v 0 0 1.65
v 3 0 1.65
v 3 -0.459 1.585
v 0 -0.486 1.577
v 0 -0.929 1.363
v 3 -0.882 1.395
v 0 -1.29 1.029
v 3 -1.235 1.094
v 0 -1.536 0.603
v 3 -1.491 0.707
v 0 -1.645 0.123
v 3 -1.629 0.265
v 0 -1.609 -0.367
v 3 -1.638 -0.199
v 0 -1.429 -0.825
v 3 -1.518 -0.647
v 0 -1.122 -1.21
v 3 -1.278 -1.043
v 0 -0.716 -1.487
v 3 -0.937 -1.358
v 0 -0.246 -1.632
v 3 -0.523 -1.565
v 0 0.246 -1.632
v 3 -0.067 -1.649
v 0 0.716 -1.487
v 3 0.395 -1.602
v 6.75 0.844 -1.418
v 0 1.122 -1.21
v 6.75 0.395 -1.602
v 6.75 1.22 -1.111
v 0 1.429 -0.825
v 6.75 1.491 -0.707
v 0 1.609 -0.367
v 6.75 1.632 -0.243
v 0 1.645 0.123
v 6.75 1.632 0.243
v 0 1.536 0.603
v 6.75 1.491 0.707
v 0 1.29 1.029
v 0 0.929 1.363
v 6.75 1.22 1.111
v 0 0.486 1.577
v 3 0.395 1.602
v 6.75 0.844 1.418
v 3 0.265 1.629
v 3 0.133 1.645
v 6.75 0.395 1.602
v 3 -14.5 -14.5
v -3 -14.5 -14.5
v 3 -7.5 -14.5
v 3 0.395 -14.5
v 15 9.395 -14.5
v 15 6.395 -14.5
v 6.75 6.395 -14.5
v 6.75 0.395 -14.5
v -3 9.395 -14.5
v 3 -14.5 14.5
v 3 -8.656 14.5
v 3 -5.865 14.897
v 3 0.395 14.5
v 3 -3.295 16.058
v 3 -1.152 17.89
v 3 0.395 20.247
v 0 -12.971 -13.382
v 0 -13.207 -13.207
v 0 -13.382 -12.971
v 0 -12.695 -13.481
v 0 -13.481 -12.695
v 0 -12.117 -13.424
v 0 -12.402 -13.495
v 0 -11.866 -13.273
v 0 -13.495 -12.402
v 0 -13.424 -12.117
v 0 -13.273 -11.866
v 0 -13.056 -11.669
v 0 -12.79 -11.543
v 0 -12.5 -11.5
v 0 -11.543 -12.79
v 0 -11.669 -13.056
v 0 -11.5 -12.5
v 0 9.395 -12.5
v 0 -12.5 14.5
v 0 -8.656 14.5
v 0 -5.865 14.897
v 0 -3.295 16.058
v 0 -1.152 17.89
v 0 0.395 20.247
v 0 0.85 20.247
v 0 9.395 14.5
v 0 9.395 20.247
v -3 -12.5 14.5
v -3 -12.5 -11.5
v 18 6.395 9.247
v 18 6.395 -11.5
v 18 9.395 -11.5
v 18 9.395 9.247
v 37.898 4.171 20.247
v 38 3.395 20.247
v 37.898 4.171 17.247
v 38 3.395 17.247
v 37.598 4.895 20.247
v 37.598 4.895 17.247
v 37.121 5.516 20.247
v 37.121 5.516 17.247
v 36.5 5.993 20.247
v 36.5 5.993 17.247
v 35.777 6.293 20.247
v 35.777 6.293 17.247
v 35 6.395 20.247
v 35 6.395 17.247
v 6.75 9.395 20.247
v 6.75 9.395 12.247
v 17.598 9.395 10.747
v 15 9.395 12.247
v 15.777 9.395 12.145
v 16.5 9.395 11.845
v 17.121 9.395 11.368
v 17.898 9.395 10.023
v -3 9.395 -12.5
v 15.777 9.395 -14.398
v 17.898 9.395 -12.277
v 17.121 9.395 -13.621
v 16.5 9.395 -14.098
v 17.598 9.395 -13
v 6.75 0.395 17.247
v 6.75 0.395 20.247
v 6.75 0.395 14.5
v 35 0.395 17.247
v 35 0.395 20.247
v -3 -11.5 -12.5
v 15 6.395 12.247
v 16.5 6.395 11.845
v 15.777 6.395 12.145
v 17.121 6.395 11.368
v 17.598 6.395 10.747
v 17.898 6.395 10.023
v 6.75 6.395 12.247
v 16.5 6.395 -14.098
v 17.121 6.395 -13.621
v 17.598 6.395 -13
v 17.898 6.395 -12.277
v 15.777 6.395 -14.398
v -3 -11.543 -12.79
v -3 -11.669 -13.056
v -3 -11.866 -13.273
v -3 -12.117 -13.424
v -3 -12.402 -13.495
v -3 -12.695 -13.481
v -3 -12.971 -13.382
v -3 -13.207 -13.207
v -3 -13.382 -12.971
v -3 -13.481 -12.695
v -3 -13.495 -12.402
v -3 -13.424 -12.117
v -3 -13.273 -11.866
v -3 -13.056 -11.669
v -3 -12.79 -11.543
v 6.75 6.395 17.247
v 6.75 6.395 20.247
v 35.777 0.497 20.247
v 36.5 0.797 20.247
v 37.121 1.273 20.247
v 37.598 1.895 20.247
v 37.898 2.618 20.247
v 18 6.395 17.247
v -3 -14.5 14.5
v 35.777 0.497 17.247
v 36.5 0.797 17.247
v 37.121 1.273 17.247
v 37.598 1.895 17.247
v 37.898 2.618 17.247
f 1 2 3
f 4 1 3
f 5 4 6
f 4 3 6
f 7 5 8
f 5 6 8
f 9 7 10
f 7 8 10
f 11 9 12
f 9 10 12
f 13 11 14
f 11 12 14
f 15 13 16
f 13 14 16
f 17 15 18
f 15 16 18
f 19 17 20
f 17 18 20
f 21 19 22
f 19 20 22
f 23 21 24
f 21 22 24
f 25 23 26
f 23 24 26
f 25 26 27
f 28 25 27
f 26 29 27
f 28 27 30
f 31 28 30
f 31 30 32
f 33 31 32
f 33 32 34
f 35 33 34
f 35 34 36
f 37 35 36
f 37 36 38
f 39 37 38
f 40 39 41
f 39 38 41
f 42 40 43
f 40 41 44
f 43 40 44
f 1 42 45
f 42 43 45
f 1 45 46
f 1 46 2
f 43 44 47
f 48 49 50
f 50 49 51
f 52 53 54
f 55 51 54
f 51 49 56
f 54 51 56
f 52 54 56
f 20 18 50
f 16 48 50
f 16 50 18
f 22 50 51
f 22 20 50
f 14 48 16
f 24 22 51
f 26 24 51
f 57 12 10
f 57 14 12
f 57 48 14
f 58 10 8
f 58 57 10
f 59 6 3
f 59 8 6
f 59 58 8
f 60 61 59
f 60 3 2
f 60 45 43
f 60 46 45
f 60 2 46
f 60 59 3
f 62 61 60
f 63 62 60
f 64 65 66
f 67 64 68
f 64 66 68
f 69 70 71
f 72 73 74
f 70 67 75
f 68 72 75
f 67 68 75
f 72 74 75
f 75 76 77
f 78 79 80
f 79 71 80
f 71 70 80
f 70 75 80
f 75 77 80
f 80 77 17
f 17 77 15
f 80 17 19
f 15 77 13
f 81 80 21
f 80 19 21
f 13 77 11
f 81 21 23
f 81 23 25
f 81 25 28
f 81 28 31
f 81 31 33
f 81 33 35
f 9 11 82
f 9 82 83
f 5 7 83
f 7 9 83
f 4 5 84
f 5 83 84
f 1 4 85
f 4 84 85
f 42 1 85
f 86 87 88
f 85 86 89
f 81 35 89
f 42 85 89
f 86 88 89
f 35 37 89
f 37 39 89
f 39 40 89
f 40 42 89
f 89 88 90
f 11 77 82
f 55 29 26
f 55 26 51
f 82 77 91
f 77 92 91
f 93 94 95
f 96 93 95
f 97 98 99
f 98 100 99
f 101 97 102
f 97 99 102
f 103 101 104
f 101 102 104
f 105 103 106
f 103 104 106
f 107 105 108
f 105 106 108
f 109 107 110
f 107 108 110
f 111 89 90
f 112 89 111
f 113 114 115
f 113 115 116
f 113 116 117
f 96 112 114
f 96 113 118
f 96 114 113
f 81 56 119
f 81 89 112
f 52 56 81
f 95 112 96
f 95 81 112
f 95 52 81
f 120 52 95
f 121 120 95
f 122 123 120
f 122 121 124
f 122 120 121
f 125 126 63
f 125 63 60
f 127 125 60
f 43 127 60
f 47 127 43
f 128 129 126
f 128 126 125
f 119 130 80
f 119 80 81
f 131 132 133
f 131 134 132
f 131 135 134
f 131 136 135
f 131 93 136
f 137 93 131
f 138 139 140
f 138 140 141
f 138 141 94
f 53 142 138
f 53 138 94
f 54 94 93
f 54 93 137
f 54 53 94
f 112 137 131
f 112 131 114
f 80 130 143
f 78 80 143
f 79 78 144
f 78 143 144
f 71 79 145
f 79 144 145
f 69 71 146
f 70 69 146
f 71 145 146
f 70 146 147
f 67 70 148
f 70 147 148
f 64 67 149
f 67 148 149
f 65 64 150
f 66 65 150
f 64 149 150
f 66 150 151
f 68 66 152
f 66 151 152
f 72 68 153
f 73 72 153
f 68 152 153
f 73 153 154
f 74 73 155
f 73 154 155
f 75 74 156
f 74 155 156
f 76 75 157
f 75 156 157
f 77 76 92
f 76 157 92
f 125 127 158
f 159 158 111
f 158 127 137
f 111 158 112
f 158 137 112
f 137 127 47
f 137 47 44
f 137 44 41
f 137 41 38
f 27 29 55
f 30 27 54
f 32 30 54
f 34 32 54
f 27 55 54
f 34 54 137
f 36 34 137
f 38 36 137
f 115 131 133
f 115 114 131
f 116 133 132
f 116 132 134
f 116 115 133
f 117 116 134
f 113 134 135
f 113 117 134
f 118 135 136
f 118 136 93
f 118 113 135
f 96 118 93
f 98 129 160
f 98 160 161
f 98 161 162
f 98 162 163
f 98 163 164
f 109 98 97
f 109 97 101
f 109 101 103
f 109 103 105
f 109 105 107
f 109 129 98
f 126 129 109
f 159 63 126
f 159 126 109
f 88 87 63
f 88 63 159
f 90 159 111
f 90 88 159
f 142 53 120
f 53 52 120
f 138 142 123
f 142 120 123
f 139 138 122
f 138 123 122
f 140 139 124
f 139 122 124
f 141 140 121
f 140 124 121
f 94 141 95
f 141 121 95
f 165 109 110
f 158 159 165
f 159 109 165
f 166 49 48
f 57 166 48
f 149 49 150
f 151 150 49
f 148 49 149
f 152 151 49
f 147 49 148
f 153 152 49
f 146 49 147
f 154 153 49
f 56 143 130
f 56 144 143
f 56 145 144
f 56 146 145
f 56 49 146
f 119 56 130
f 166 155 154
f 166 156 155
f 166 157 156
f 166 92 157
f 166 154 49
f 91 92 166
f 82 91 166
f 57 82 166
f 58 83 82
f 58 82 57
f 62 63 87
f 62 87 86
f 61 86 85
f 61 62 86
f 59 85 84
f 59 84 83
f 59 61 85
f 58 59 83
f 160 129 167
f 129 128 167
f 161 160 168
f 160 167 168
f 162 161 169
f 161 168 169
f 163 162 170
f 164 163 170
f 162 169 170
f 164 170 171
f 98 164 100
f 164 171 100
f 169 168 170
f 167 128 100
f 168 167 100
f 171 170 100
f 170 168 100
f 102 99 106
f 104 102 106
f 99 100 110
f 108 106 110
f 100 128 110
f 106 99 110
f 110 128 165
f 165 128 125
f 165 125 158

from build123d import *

# Parameters (mm, degrees)
EXTRUDE_1_DEPTH      = 5
EXTRUDE_1_DEPTH_BACK = 3
SKETCH_2_W           = 29
SKETCH_2_H           = 29
SKETCH_3_W           = 25
SKETCH_3_H           = 25
CUT_EXTRUDE_1_DEPTH  = 3
SKETCH_5_R           = 1
CUT_EXTRUDE_3_DEPTH  = 3
CUT_EXTRUDE_4_DEPTH  = 23.011360703
HOLE_WIZARD_M3_1_D   = 2.5
SKETCH_4_W           = 8
SKETCH_4_H           = 29
EXTRUDE_2_DEPTH      = 13.4052
SKETCH_7_W           = 29
SKETCH_7_H           = 5
EXTRUDE_3_DEPTH      = 5
SKETCH_10_W          = 29
SKETCH_10_H          = 13.4052
CUT_EXTRUDE_5_DEPTH  = 35.028667136
EXTRUDE_4_DEPTH      = 28
SKETCH_13_W          = 22.441758485
SKETCH_13_H          = 29
CUT_EXTRUDE_7_DEPTH  = 20.8948
SKETCH_14_W          = 27
SKETCH_14_H          = 6.1052
CUT_EXTRUDE_8_DEPTH  = 10
EXTRUDE_5_DEPTH      = 10
SKETCH_16_W          = 12.441758485
SKETCH_16_H          = 20.8948
CUT_EXTRUDE_9_DEPTH  = 5
CUT_EXTRUDE_10_DEPTH = 5
SKETCH_18_W          = 7.441758485
SKETCH_18_H          = 20.8948
CUT_EXTRUDE_11_DEPTH = 1.9068532
SKETCH_19_W          = 18
SKETCH_19_H          = 8
CUT_EXTRUDE_12_DEPTH = 7
SKETCH_20_W          = 3.0931468
SKETCH_20_H          = 11
EXTRUDE_6_DEPTH      = 20
SKETCH_21_W          = 3.0931468
SKETCH_21_H          = 2.8948
CUT_EXTRUDE_13_DEPTH = 7.441758485
SKETCH_22_W          = 29
SKETCH_22_H          = 7
CUT_EXTRUDE_14_DEPTH = 7.558241515
EXTRUDE_7_DEPTH      = 3
SKETCH_24_W          = 3
SKETCH_24_H          = 11
CUT_EXTRUDE_15_DEPTH = 50.942466899
CUT_EXTRUDE_16_DEPTH = 3.8082415
SKETCH_26_W          = 11.249999985
SKETCH_26_H          = 6.1052
CUT_EXTRUDE_17_DEPTH = 6.0931468
SKETCH_27_W          = 6.0931468
SKETCH_27_H          = 6.1052
CUT_EXTRUDE_18_DEPTH = 43.86096708
CUT_EXTRUDE_19_DEPTH = 3.1052
SKETCH_30_W          = 3.750000015
SKETCH_30_H          = 32.721043552
CUT_EXTRUDE_20_DEPTH = 7.8948
CUT_EXTRUDE_21_DEPTH = 4.9068532
SKETCH_32_W          = 31.249999985
SKETCH_32_H          = 6.0931468
CUT_EXTRUDE_22_DEPTH = 3.5
SKETCH_33_W          = 11
SKETCH_33_H          = 13.8948
EXTRUDE_8_DEPTH      = 3
SKETCH_34_W          = 11
SKETCH_34_H          = 6.3948
CUT_EXTRUDE_25_DEPTH = 49.005208051
EXTRUDE_9_DEPTH      = 0.3948
SKETCH_36_W          = 38
SKETCH_36_H          = 7.8948
CUT_EXTRUDE_26_DEPTH = 2.5931468
CUT_EXTRUDE_27_DEPTH = 3.5
SKETCH_38_W          = 1.185809648
SKETCH_38_H          = 4.3948
CUT_EXTRUDE_28_DEPTH = 3.750000015
EXTRUDE_11_DEPTH     = 3
EXTRUDE_12_REACH     = 51.952
SKETCH_41_W          = 35
SKETCH_41_H          = 4.3948
EXTRUDE_13_DEPTH     = 2.16
SKETCH_42_W          = 11.238283167
SKETCH_42_H          = 6
EXTRUDE_14_DEPTH     = 3
SKETCH_43_W          = 3
SKETCH_43_H          = 6
EXTRUDE_15_DEPTH     = 20.011716818
SKETCH_44_W          = 3.319178761
SKETCH_44_H          = 21.949008861
CUT_EXTRUDE_29_DEPTH = 47.679480755
SKETCH_45_W          = 3
SKETCH_45_H          = 4.3948
CUT_EXTRUDE_30_DEPTH = 35
SKETCH_46_W          = 5.7468532
SKETCH_46_H          = 8.544893469
EXTRUDE_16_DEPTH     = 18
SKETCH_47_W          = 11.249999985
SKETCH_47_H          = 5.544893469
CUT_EXTRUDE_31_DEPTH = 2.7468532
SKETCH_48_W          = 5.7468532
SKETCH_48_H          = 14.8948
CUT_EXTRUDE_32_DEPTH = 43.95561738
SKETCH_49_W          = 8
SKETCH_49_H          = 3
CUT_EXTRUDE_33_DEPTH = 11.249999985
FILLET_3_R           = 10
FILLET_4_R           = 3
HOLE_WIZARD_M4_1_D   = 3.3


# Some blends are built 0.0001 mm under size
with BuildPart() as part:
    # 草图2 → 凸台-拉伸1 (new, two sides: drawn at the far end of the back side and taken through both)
    with BuildSketch(Plane(origin=(0, 0, 0), x_dir=(0, 0, -1), z_dir=(1, 0, 0)).offset(-EXTRUDE_1_DEPTH_BACK)):
        Rectangle(SKETCH_2_W, SKETCH_2_H)
    extrude(amount=EXTRUDE_1_DEPTH + EXTRUDE_1_DEPTH_BACK)

    # 草图3 → 切除-拉伸1 (cut)
    with BuildSketch(Plane.ZY.offset(3)):
        Rectangle(SKETCH_3_W, SKETCH_3_H)
    extrude(amount=-CUT_EXTRUDE_1_DEPTH, mode=Mode.SUBTRACT)

    # 草图5 → 切除-拉伸3 (cut)
    with BuildSketch(Plane.ZY.offset(3)):
        with Locations((-12.5, -12.5)):
            Circle(SKETCH_5_R)
    extrude(amount=-CUT_EXTRUDE_3_DEPTH, mode=Mode.SUBTRACT)

    # 草图6 → 切除-拉伸4 (cut, through all)
    with BuildSketch(Plane.ZY.offset(3)):
        Polygon((12.5, 12.5), (12.5, -12.5), (14.5, -12.5), (14.5, 14.5), (-12.5, 14.5), (-14.5, 14.5), (-14.5, 12.5), (-12.5, 12.5), align=None)
    extrude(amount=-CUT_EXTRUDE_4_DEPTH, mode=Mode.SUBTRACT)

    # M3 螺纹孔1 (through all)
    with Locations(Plane.ZY):
        with Locations((0, 0)):
            Hole(HOLE_WIZARD_M3_1_D / 2)

    # 草图4 → 凸台-拉伸2 (add)
    with BuildSketch(Plane.XZ.offset(14.5)):
        with Locations((1, 0)):
            Rectangle(SKETCH_4_W, SKETCH_4_H)
    extrude(amount=EXTRUDE_2_DEPTH)

    # 草图7 → 凸台-拉伸3 (add)
    with BuildSketch(Plane(origin=(5, 0, 0), x_dir=(0, 0, -1), z_dir=(1, 0, 0))):
        with Locations((0, -25.4052)):
            Rectangle(SKETCH_7_W, SKETCH_7_H)
    extrude(amount=EXTRUDE_3_DEPTH)

    # 草图10 → 切除-拉伸5 (cut, through all)
    with BuildSketch(Plane.ZY.offset(3)):
        with Locations((0, -21.2026)):
            Rectangle(SKETCH_10_W, SKETCH_10_H)
    extrude(amount=-CUT_EXTRUDE_5_DEPTH, mode=Mode.SUBTRACT)

    # 草图12 → 凸台-拉伸4 (add)
    with BuildSketch(Plane(origin=(5, 0, 0), x_dir=(0, 0, -1), z_dir=(1, 0, 0))):
        Polygon((-14.5, -14.5), (14.5, -14.5), (14.5, 12.5), (-12.5, 12.5), (-12.5, -12.5), (-14.5, -12.5), align=None)
    extrude(amount=EXTRUDE_4_DEPTH)

    # 草图13 → 切除-拉伸7 (cut)
    with BuildSketch(Plane.XZ.offset(14.5)):
        with Locations((21.779120757, 0)):
            Rectangle(SKETCH_13_W, SKETCH_13_H)
    extrude(amount=-CUT_EXTRUDE_7_DEPTH, mode=Mode.SUBTRACT)

    # 草图14 → 切除-拉伸8 (cut)
    with BuildSketch(Plane(origin=(33, 0, 0), x_dir=(0, 0, -1), z_dir=(1, 0, 0))):
        with Locations((1, 9.4474)):
            Rectangle(SKETCH_14_W, SKETCH_14_H)
    extrude(amount=-CUT_EXTRUDE_8_DEPTH, mode=Mode.SUBTRACT)

    # 草图15 → 凸台-拉伸5 (add)
    with BuildSketch(Plane.XY.offset(12.5)):
        Polygon((23, 6.3948), (23, 12.5), (0, 12.5), (0, -14.5), (23, -14.5), align=None)
    extrude(amount=EXTRUDE_5_DEPTH)

    # 草图16 → 切除-拉伸9 (cut)
    with BuildSketch(Plane(origin=(0, 0, 12.5), x_dir=(-1, 0, 0), z_dir=(0, 0, -1))):
        with Locations((-16.779120757, -4.0526)):
            Rectangle(SKETCH_16_W, SKETCH_16_H)
    extrude(amount=-CUT_EXTRUDE_9_DEPTH, mode=Mode.SUBTRACT)

    # 草图17 → 切除-拉伸10 (cut)
    with BuildSketch(Plane(origin=(23, 0, 0), x_dir=(0, 0, -1), z_dir=(1, 0, 0))):
        Polygon((-17.5, -14.5), (-17.5, 6.3948), (14.5, 6.3948), (14.5, 12.5), (-22.5, 12.5), (-22.5, -14.5), align=None)
    extrude(amount=-CUT_EXTRUDE_10_DEPTH, mode=Mode.SUBTRACT)

    # 草图18 → 切除-拉伸11 (cut)
    with BuildSketch(Plane(origin=(0, 0, 17.5), x_dir=(-1, 0, 0), z_dir=(0, 0, -1))):
        with Locations((-14.279120757, -4.0526)):
            Rectangle(SKETCH_18_W, SKETCH_18_H)
    extrude(amount=-CUT_EXTRUDE_11_DEPTH, mode=Mode.SUBTRACT)

    # 草图19 → 切除-拉伸12 (cut)
    with BuildSketch(Plane.XZ.offset(14.5)):
        with Locations((9, 18.5)):
            Rectangle(SKETCH_19_W, SKETCH_19_H)
    extrude(amount=-CUT_EXTRUDE_12_DEPTH, mode=Mode.SUBTRACT)

    # 草图20 → 凸台-拉伸6 (add)
    with BuildSketch(Plane(origin=(18, 0, 0), x_dir=(0, 0, -1), z_dir=(1, 0, 0))):
        with Locations((-20.9534266, -2)):
            Rectangle(SKETCH_20_W, SKETCH_20_H)
    extrude(amount=EXTRUDE_6_DEPTH)

    # 草图21 → 切除-拉伸13 (cut)
    with BuildSketch(Plane(origin=(18, 0, 0), x_dir=(0, 0, -1), z_dir=(1, 0, 0))):
        with Locations((-20.9534266, 4.9474)):
            Rectangle(SKETCH_21_W, SKETCH_21_H)
    extrude(amount=-CUT_EXTRUDE_13_DEPTH, mode=Mode.SUBTRACT)

    # 草图22 → 切除-拉伸14 (cut)
    with BuildSketch(Plane(origin=(10.558241515, 0, 0), x_dir=(0, 0, -1), z_dir=(1, 0, 0))):
        with Locations((0, -11)):
            Rectangle(SKETCH_22_W, SKETCH_22_H)
    extrude(amount=-CUT_EXTRUDE_14_DEPTH, mode=Mode.SUBTRACT)

    # 草图23 → 凸台-拉伸7 (add)
    with BuildSketch(Plane.XY.offset(22.5)):
        Polygon((10.558241515, 6.3948), (18, 6.3948), (18, 12.5), (0, 12.5), (0, -7.5), (38, -7.5), (38, 3.5), (10.558241515, 3.5), align=None)
    extrude(amount=EXTRUDE_7_DEPTH)

    # 草图24 → 切除-拉伸15 (cut, through all)
    with BuildSketch(Plane.XZ.offset(7.5)):
        with Locations((1.5, 20)):
            Rectangle(SKETCH_24_W, SKETCH_24_H)
    extrude(amount=-CUT_EXTRUDE_15_DEPTH, mode=Mode.SUBTRACT)

    # 草图25 → 切除-拉伸16 (cut)
    with BuildSketch(Plane(origin=(10.558241515, 0, 0), x_dir=(0, 0, -1), z_dir=(1, 0, 0))):
        Polygon((-19.4068532, -7.5), (14.5, -7.5), (14.5, 6.3948), (-25.5, 6.3948), (-25.5, 3.5), (-19.4068532, 3.5), align=None)
    extrude(amount=-CUT_EXTRUDE_16_DEPTH, mode=Mode.SUBTRACT)

    # 草图26 → 切除-拉伸17 (cut)
    with BuildSketch(Plane.XY.offset(25.5)):
        with Locations((12.375000008, 9.4474)):
            Rectangle(SKETCH_26_W, SKETCH_26_H)
    extrude(amount=-CUT_EXTRUDE_17_DEPTH, mode=Mode.SUBTRACT)

    # 草图27 → 切除-拉伸18 (cut, through all)
    with BuildSketch(Plane(origin=(6.750000015, 0, 0), x_dir=(0, 0, -1), z_dir=(1, 0, 0))):
        with Locations((-22.4534266, 9.4474)):
            Rectangle(SKETCH_27_W, SKETCH_27_H)
    extrude(amount=-CUT_EXTRUDE_18_DEPTH, mode=Mode.SUBTRACT)

    # 草图28 → 切除-拉伸19 (cut)
    with BuildSketch(Plane(origin=(0, 12.5, 0), x_dir=(1, 0, 0), z_dir=(0, 1, 0))):
        Polygon((3, -14.5), (3, -19.4068532), (18, -19.4068532), (18, 14.5), (-3, 14.5), (-3, 12.5), (0, 12.5), (0, -14.5), align=None)
    extrude(amount=-CUT_EXTRUDE_19_DEPTH, mode=Mode.SUBTRACT)

    # 草图30 → 切除-拉伸20 (cut)
    with BuildSketch(Plane.XZ.offset(7.5)):
        with Locations((4.875000008, 1.860521776)):
            Rectangle(SKETCH_30_W, SKETCH_30_H)
    extrude(amount=-CUT_EXTRUDE_20_DEPTH, mode=Mode.SUBTRACT)

    # 草图31 → 切除-拉伸21 (cut)
    with BuildSketch(Plane.XY.offset(19.4068532)):
        Polygon((18, 6.3948), (18, 9.3948), (3, 9.3948), (3, 6.3948), (6.750000015, 6.3948), align=None)
    extrude(amount=-CUT_EXTRUDE_21_DEPTH, mode=Mode.SUBTRACT)

    # 草图32 → 切除-拉伸22 (cut)
    with BuildSketch(Plane(origin=(0, 3.5, 0), x_dir=(1, 0, 0), z_dir=(0, 1, 0))):
        with Locations((22.375000007, -22.4534266)):
            Rectangle(SKETCH_32_W, SKETCH_32_H)
    extrude(amount=-CUT_EXTRUDE_22_DEPTH, mode=Mode.SUBTRACT)

    # 草图33 → 凸台-拉伸8 (add)
    with BuildSketch(Plane.ZY.offset(-3)):
        with Locations((20, -0.5526)):
            Rectangle(SKETCH_33_W, SKETCH_33_H)
    extrude(amount=EXTRUDE_8_DEPTH)

    # 草图34 → 切除-拉伸25 (cut, through all)
    with BuildSketch(Plane(origin=(0, 0, 0), x_dir=(0, 0, -1), z_dir=(1, 0, 0))):
        with Locations((-20, 3.1974)):
            Rectangle(SKETCH_34_W, SKETCH_34_H)
    extrude(amount=CUT_EXTRUDE_25_DEPTH, mode=Mode.SUBTRACT)

    # 草图35 → 凸台-拉伸9 (add)
    with BuildSketch(Plane(origin=(0, 0, 0), x_dir=(1, 0, 0), z_dir=(0, 1, 0))):
        Polygon((38, -25.5), (38, -19.4068532), (6.750000015, -19.4068532), (6.750000015, -18.221043552), (3, -18.221043552), (3, -14.5), (0, -14.5), (0, -25.5), align=None)
    extrude(amount=EXTRUDE_9_DEPTH)

    # 草图36 → 切除-拉伸26 (cut)
    with BuildSketch(Plane.XY.offset(25.5)):
        with Locations((19, -3.5526)):
            Rectangle(SKETCH_36_W, SKETCH_36_H)
    extrude(amount=-CUT_EXTRUDE_26_DEPTH, mode=Mode.SUBTRACT)

    # 草图37 → 切除-拉伸27 (cut)
    with BuildSketch(Plane(origin=(0, 0.3948, 0), x_dir=(1, 0, 0), z_dir=(0, 1, 0))):
        Polygon((3, -14.5), (0, -14.5), (0, -22.9068532), (38, -22.9068532), (38, -19.4068532), (6.750000015, -19.4068532), (6.750000015, -18.221043552), (3, -18.221043552), align=None)
    extrude(amount=-CUT_EXTRUDE_27_DEPTH, mode=Mode.SUBTRACT)

    # 草图38 → 切除-拉伸28 (cut)
    with BuildSketch(Plane(origin=(6.750000015, 0, 0), x_dir=(0, 0, -1), z_dir=(1, 0, 0))):
        with Locations((-18.813948376, -5.3026)):
            Rectangle(SKETCH_38_W, SKETCH_38_H)
    extrude(amount=-CUT_EXTRUDE_28_DEPTH, mode=Mode.SUBTRACT)

    # 草图39 → 凸台-拉伸11 (add)
    with BuildSketch(Plane(origin=(3, 0, 0), x_dir=(0, 0, -1), z_dir=(1, 0, 0))):
        Polygon((-14.5, 9.3948), (-14.5, -14.5), (-22.9068532, -7.5), (-22.9068532, -3.1052), align=None)
    extrude(amount=-EXTRUDE_11_DEPTH)

    # 凸台-拉伸12: up to this face of the body (flat: up to its plane)
    extrude_12_end = Plane(part.part.faces().sort_by_distance((1.5, 3.1448, 18.7034266))[0])
    # 草图40 → 凸台-拉伸12 (add, up to the picked face)
    with BuildSketch(Plane.XY.offset(14.5), mode=Mode.PRIVATE) as extrude_12_sk1:
        Polygon((3, 9.3948), (3, 0.3948), (6.750000015, 0.3948), (6.750000015, 6.3948), (18, 6.3948), (18, 9.3948), align=None)
    extrude_12_tool1 = split(extrude(extrude_12_sk1.sketch, amount=EXTRUDE_12_REACH, mode=Mode.PRIVATE), bisect_by=extrude_12_end, keep=Keep.BOTH, mode=Mode.PRIVATE)
    add(extrude_12_tool1.solids().sort_by(Axis((3.174929, 4.8948, 14.5), (0, 0, 1)))[0])

    # 草图41 → 凸台-拉伸13 (add)
    with BuildSketch(Plane(origin=(0, 0, 19.4068532), x_dir=(-1, 0, 0), z_dir=(0, 0, -1))):
        with Locations((-20.5, -5.3026)):
            Rectangle(SKETCH_41_W, SKETCH_41_H)
    extrude(amount=EXTRUDE_13_DEPTH)

    # 草图42 → 凸台-拉伸14 (add)
    with BuildSketch(Plane(origin=(0, 0, 17.2468532), x_dir=(-1, 0, 0), z_dir=(0, 0, -1))):
        with Locations((-12.369141599, 3.3948)):
            Rectangle(SKETCH_42_W, SKETCH_42_H)
    extrude(amount=-EXTRUDE_14_DEPTH)

    # 草图43 → 凸台-拉伸15 (add)
    with BuildSketch(Plane(origin=(17.988283182, 0, 0), x_dir=(0, 0, -1), z_dir=(1, 0, 0))):
        with Locations((-18.7468532, 3.3948)):
            Rectangle(SKETCH_43_W, SKETCH_43_H)
    extrude(amount=EXTRUDE_15_DEPTH)

    # 草图44 → 切除-拉伸29 (cut, through all)
    with BuildSketch(Plane.ZY):
        with Locations((21.90644258, -4.579704431)):
            Rectangle(SKETCH_44_W, SKETCH_44_H)
    extrude(amount=-CUT_EXTRUDE_29_DEPTH, mode=Mode.SUBTRACT)

    # 草图45 → 切除-拉伸30 (cut)
    with BuildSketch(Plane(origin=(38, 0, 0), x_dir=(0, 0, -1), z_dir=(1, 0, 0))):
        with Locations((-18.7468532, -5.3026)):
            Rectangle(SKETCH_45_W, SKETCH_45_H)
    extrude(amount=-CUT_EXTRUDE_30_DEPTH, mode=Mode.SUBTRACT)

    # 草图46 → 凸台-拉伸16 (add)
    with BuildSketch(Plane.ZY):
        with Locations((17.3734266, 5.122353266)):
            Rectangle(SKETCH_46_W, SKETCH_46_H)
    extrude(amount=-EXTRUDE_16_DEPTH)

    # 草图47 → 切除-拉伸31 (cut)
    with BuildSketch(Plane(origin=(0, 0, 14.5), x_dir=(-1, 0, 0), z_dir=(0, 0, -1))):
        with Locations((-12.375000008, 3.622353266)):
            Rectangle(SKETCH_47_W, SKETCH_47_H)
    extrude(amount=-CUT_EXTRUDE_31_DEPTH, mode=Mode.SUBTRACT)

    # 草图48 → 切除-拉伸32 (cut, through all)
    with BuildSketch(Plane(origin=(3, 0, 0), x_dir=(0, 0, -1), z_dir=(1, 0, 0))):
        with Locations((-17.3734266, -7.0526)):
            Rectangle(SKETCH_48_W, SKETCH_48_H)
    extrude(amount=-CUT_EXTRUDE_32_DEPTH, mode=Mode.SUBTRACT)

    # 草图49 → 切除-拉伸33 (cut)
    with BuildSketch(Plane(origin=(18, 0, 0), x_dir=(0, 0, -1), z_dir=(1, 0, 0))):
        with Locations((-16.2468532, 7.8948)):
            Rectangle(SKETCH_49_W, SKETCH_49_H)
    extrude(amount=-CUT_EXTRUDE_33_DEPTH, mode=Mode.SUBTRACT)

    # 圆角3
    # the kernel refuses this fillet: 10 mm, written as the material it adds along each edge
    with BuildSketch(Plane(origin=(3, 0.3948, 14.5), x_dir=(0, -1, 0), z_dir=(-1, 0, 0))) as fillet_3_piece_1:
        with BuildLine():
            CenterArc((9.050455364, 10), FILLET_3_R, 205.170583254, 64.829416746)
            Line((0, 5.7468532), (0, 0))
            Line((0, 0), (9.050455364, 0))
        make_face()
    extrude(amount=3)

    # 圆角4
    fillet_4_edges = [part.edges().sort_by_distance(p)[0] for p in [
        (38, 6.3948, 18.7468532),
        (38, 0.3948, 18.7468532),
        (18, 7.8948, -14.5),
        (18, 7.8948, 12.2468532),
    ]]
    fillet(fillet_4_edges, radius=FILLET_4_R - 0.0001)  # a hair under: the kernel refuses the full size

    # M4 螺纹孔1 (through all)
    with Locations(Plane(origin=(0, 0, 0), x_dir=(0, 0, -1), z_dir=(-1, 0, 0))):
        with Locations((0, 0)):
            Hole(HOLE_WIZARD_M4_1_D / 2)


solid = part.part
